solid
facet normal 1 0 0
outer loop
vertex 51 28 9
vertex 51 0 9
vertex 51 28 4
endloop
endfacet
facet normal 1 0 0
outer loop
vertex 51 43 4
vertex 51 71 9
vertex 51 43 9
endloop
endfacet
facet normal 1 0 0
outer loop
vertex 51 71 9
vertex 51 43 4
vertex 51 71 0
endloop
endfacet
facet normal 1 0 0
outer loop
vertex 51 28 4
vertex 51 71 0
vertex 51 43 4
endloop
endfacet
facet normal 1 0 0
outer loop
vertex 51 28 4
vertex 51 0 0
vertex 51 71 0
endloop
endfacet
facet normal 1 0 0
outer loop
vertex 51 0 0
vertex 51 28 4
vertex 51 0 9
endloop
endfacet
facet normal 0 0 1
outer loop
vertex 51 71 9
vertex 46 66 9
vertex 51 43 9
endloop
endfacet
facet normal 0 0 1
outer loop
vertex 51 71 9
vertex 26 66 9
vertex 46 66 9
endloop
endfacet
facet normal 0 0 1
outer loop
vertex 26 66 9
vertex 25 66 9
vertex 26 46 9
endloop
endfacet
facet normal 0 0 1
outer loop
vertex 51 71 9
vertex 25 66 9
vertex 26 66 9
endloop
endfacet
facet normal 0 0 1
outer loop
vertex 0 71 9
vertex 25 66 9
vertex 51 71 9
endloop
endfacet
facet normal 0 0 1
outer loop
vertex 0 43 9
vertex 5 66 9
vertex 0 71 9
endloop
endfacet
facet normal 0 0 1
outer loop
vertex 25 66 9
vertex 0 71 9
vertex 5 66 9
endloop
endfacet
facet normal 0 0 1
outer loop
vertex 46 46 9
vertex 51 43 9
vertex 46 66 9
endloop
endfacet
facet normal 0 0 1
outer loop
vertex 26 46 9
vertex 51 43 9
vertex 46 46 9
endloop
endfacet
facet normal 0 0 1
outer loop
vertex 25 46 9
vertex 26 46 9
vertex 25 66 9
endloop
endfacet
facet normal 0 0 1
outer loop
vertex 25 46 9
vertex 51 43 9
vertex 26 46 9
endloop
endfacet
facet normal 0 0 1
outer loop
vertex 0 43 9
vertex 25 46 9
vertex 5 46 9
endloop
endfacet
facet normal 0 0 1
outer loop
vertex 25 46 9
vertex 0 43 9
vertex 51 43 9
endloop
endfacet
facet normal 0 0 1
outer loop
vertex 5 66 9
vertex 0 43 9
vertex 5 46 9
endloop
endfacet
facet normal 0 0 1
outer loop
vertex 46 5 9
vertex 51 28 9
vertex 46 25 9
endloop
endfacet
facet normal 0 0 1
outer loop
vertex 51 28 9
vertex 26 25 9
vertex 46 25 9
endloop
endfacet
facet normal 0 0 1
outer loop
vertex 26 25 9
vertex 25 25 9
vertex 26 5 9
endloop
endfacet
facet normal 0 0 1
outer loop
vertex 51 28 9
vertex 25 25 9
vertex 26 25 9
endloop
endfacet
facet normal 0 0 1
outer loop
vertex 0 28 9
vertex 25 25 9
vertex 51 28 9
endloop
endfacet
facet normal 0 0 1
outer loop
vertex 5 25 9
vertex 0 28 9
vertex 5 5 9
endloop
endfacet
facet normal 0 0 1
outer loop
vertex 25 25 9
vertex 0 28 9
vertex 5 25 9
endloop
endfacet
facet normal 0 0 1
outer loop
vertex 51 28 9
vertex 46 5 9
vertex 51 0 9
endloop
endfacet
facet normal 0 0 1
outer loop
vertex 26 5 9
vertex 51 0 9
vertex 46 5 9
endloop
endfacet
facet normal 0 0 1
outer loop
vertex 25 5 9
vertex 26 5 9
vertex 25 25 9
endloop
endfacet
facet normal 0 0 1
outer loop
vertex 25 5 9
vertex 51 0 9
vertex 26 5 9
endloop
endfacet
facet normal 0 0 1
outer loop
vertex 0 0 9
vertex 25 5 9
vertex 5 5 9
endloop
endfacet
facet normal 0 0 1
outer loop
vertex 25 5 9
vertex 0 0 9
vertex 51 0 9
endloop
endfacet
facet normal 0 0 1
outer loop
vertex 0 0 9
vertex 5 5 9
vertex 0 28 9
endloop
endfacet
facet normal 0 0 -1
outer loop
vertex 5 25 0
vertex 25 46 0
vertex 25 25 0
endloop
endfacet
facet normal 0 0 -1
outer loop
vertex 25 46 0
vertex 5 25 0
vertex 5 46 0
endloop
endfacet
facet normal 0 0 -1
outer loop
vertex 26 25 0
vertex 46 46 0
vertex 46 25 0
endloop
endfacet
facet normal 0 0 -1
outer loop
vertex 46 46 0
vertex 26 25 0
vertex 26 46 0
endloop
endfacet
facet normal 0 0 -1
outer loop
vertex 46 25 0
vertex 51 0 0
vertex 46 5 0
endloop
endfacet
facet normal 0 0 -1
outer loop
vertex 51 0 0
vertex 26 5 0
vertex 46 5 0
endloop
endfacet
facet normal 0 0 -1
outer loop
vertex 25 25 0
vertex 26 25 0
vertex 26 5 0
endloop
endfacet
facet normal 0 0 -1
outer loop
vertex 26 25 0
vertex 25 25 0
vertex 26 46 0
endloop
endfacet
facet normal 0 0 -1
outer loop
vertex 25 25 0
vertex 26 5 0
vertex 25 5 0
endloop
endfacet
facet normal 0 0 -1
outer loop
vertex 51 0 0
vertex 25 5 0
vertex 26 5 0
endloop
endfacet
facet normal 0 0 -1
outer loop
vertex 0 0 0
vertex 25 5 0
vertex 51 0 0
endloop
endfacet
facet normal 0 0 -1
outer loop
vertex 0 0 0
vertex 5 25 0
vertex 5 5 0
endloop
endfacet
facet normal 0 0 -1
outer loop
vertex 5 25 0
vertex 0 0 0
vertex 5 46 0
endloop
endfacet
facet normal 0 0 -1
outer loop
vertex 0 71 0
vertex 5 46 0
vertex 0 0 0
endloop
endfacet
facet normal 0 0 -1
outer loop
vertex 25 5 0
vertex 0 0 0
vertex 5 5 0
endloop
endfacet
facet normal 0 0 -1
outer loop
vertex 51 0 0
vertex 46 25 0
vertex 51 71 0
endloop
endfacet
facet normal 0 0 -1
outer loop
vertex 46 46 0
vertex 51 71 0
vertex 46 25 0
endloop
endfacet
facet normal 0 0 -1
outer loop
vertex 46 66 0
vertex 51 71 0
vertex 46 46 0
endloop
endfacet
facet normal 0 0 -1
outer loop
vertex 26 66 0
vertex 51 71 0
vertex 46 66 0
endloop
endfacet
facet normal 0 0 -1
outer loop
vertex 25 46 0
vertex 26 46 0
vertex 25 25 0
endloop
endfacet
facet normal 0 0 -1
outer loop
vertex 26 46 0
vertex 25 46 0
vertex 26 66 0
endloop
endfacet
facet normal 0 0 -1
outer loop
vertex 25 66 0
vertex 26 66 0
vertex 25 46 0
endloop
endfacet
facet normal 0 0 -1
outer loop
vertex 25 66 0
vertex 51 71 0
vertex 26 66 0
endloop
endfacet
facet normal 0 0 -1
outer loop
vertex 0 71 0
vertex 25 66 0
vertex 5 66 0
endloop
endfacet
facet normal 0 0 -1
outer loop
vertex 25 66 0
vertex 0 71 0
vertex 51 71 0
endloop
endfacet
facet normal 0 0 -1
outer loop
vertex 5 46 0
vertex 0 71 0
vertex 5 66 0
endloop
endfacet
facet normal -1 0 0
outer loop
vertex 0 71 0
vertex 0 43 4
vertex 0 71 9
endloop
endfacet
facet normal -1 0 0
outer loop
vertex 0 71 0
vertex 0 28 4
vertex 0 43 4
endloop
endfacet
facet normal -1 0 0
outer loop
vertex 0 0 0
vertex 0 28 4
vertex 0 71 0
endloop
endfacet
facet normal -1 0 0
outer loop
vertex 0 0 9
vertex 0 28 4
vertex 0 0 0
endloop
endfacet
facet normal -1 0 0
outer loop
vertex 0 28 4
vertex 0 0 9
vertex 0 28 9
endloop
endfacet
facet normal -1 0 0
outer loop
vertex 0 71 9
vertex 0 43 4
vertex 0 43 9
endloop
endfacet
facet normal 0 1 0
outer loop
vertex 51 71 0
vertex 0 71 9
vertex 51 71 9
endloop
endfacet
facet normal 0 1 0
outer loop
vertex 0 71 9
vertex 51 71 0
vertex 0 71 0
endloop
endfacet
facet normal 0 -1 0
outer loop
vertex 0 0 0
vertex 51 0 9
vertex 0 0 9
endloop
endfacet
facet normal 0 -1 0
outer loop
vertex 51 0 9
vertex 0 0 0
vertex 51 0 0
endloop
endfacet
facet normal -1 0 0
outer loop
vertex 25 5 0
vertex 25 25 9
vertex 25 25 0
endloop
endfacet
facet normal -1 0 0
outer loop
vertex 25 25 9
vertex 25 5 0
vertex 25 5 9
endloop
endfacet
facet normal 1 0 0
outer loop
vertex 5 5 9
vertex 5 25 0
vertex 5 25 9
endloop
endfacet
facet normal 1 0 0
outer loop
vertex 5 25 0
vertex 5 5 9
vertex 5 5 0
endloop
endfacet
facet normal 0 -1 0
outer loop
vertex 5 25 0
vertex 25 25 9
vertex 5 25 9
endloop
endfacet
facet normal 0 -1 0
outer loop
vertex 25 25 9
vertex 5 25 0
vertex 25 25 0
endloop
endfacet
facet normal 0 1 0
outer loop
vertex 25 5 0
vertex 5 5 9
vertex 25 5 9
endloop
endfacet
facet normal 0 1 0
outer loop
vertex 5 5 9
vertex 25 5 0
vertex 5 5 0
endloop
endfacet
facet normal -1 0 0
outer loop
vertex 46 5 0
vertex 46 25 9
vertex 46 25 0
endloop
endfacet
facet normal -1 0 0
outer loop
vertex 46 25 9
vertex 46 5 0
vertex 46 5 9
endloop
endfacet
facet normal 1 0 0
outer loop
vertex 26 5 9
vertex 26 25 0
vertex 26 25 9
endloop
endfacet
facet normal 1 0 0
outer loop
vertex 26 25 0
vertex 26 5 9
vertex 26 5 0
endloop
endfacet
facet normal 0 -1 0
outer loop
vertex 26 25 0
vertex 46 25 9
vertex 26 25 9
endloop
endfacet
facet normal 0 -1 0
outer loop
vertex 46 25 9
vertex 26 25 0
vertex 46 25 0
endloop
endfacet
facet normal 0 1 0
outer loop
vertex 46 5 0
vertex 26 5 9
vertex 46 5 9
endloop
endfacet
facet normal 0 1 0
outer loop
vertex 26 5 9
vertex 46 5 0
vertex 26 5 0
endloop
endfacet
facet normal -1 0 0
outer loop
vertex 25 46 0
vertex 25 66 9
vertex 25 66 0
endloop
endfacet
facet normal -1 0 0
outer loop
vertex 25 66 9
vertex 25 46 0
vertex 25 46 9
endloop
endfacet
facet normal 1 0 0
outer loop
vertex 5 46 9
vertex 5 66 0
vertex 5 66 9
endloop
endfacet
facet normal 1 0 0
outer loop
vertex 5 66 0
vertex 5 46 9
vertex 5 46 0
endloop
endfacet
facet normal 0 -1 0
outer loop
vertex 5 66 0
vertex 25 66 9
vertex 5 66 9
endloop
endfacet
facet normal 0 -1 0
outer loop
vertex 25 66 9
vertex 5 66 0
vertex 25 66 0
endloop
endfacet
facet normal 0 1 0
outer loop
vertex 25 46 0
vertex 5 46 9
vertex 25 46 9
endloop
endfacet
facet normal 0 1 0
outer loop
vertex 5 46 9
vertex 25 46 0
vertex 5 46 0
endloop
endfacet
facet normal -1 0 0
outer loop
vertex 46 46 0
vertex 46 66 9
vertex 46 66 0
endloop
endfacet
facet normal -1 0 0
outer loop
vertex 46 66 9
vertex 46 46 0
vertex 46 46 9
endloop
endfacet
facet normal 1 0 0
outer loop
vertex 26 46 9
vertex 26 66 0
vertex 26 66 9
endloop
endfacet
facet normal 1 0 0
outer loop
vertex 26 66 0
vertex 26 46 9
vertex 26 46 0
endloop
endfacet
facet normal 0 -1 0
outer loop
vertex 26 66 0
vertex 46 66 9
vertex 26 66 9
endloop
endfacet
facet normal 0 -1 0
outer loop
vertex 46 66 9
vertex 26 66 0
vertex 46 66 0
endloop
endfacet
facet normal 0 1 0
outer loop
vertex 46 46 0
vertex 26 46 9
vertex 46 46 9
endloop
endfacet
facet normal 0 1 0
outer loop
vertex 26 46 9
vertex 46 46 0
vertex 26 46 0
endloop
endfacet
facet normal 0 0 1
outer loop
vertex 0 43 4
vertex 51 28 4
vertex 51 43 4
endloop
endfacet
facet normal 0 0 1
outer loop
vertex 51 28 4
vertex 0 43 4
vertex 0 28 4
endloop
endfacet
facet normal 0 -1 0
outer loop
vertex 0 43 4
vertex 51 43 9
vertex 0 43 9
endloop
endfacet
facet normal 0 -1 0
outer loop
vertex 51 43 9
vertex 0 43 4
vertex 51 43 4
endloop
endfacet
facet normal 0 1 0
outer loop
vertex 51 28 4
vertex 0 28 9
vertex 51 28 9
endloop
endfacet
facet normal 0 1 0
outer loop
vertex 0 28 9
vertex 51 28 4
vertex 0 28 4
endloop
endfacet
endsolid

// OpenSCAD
module loch() {
    cube([20,20,11]);
}


module aufhaengung() {
    difference() {
        translate ([0,0,0]) cube([51,71,9]);
        translate ([5,5,-1]) loch();
        translate ([26,5,-1]) loch();
        translate ([5,46,-1]) loch();
        translate ([26,46,-1]) loch();   
        translate ([-1,28,4]) cube([53,15,6]);             
    }
}

aufhaengung();
